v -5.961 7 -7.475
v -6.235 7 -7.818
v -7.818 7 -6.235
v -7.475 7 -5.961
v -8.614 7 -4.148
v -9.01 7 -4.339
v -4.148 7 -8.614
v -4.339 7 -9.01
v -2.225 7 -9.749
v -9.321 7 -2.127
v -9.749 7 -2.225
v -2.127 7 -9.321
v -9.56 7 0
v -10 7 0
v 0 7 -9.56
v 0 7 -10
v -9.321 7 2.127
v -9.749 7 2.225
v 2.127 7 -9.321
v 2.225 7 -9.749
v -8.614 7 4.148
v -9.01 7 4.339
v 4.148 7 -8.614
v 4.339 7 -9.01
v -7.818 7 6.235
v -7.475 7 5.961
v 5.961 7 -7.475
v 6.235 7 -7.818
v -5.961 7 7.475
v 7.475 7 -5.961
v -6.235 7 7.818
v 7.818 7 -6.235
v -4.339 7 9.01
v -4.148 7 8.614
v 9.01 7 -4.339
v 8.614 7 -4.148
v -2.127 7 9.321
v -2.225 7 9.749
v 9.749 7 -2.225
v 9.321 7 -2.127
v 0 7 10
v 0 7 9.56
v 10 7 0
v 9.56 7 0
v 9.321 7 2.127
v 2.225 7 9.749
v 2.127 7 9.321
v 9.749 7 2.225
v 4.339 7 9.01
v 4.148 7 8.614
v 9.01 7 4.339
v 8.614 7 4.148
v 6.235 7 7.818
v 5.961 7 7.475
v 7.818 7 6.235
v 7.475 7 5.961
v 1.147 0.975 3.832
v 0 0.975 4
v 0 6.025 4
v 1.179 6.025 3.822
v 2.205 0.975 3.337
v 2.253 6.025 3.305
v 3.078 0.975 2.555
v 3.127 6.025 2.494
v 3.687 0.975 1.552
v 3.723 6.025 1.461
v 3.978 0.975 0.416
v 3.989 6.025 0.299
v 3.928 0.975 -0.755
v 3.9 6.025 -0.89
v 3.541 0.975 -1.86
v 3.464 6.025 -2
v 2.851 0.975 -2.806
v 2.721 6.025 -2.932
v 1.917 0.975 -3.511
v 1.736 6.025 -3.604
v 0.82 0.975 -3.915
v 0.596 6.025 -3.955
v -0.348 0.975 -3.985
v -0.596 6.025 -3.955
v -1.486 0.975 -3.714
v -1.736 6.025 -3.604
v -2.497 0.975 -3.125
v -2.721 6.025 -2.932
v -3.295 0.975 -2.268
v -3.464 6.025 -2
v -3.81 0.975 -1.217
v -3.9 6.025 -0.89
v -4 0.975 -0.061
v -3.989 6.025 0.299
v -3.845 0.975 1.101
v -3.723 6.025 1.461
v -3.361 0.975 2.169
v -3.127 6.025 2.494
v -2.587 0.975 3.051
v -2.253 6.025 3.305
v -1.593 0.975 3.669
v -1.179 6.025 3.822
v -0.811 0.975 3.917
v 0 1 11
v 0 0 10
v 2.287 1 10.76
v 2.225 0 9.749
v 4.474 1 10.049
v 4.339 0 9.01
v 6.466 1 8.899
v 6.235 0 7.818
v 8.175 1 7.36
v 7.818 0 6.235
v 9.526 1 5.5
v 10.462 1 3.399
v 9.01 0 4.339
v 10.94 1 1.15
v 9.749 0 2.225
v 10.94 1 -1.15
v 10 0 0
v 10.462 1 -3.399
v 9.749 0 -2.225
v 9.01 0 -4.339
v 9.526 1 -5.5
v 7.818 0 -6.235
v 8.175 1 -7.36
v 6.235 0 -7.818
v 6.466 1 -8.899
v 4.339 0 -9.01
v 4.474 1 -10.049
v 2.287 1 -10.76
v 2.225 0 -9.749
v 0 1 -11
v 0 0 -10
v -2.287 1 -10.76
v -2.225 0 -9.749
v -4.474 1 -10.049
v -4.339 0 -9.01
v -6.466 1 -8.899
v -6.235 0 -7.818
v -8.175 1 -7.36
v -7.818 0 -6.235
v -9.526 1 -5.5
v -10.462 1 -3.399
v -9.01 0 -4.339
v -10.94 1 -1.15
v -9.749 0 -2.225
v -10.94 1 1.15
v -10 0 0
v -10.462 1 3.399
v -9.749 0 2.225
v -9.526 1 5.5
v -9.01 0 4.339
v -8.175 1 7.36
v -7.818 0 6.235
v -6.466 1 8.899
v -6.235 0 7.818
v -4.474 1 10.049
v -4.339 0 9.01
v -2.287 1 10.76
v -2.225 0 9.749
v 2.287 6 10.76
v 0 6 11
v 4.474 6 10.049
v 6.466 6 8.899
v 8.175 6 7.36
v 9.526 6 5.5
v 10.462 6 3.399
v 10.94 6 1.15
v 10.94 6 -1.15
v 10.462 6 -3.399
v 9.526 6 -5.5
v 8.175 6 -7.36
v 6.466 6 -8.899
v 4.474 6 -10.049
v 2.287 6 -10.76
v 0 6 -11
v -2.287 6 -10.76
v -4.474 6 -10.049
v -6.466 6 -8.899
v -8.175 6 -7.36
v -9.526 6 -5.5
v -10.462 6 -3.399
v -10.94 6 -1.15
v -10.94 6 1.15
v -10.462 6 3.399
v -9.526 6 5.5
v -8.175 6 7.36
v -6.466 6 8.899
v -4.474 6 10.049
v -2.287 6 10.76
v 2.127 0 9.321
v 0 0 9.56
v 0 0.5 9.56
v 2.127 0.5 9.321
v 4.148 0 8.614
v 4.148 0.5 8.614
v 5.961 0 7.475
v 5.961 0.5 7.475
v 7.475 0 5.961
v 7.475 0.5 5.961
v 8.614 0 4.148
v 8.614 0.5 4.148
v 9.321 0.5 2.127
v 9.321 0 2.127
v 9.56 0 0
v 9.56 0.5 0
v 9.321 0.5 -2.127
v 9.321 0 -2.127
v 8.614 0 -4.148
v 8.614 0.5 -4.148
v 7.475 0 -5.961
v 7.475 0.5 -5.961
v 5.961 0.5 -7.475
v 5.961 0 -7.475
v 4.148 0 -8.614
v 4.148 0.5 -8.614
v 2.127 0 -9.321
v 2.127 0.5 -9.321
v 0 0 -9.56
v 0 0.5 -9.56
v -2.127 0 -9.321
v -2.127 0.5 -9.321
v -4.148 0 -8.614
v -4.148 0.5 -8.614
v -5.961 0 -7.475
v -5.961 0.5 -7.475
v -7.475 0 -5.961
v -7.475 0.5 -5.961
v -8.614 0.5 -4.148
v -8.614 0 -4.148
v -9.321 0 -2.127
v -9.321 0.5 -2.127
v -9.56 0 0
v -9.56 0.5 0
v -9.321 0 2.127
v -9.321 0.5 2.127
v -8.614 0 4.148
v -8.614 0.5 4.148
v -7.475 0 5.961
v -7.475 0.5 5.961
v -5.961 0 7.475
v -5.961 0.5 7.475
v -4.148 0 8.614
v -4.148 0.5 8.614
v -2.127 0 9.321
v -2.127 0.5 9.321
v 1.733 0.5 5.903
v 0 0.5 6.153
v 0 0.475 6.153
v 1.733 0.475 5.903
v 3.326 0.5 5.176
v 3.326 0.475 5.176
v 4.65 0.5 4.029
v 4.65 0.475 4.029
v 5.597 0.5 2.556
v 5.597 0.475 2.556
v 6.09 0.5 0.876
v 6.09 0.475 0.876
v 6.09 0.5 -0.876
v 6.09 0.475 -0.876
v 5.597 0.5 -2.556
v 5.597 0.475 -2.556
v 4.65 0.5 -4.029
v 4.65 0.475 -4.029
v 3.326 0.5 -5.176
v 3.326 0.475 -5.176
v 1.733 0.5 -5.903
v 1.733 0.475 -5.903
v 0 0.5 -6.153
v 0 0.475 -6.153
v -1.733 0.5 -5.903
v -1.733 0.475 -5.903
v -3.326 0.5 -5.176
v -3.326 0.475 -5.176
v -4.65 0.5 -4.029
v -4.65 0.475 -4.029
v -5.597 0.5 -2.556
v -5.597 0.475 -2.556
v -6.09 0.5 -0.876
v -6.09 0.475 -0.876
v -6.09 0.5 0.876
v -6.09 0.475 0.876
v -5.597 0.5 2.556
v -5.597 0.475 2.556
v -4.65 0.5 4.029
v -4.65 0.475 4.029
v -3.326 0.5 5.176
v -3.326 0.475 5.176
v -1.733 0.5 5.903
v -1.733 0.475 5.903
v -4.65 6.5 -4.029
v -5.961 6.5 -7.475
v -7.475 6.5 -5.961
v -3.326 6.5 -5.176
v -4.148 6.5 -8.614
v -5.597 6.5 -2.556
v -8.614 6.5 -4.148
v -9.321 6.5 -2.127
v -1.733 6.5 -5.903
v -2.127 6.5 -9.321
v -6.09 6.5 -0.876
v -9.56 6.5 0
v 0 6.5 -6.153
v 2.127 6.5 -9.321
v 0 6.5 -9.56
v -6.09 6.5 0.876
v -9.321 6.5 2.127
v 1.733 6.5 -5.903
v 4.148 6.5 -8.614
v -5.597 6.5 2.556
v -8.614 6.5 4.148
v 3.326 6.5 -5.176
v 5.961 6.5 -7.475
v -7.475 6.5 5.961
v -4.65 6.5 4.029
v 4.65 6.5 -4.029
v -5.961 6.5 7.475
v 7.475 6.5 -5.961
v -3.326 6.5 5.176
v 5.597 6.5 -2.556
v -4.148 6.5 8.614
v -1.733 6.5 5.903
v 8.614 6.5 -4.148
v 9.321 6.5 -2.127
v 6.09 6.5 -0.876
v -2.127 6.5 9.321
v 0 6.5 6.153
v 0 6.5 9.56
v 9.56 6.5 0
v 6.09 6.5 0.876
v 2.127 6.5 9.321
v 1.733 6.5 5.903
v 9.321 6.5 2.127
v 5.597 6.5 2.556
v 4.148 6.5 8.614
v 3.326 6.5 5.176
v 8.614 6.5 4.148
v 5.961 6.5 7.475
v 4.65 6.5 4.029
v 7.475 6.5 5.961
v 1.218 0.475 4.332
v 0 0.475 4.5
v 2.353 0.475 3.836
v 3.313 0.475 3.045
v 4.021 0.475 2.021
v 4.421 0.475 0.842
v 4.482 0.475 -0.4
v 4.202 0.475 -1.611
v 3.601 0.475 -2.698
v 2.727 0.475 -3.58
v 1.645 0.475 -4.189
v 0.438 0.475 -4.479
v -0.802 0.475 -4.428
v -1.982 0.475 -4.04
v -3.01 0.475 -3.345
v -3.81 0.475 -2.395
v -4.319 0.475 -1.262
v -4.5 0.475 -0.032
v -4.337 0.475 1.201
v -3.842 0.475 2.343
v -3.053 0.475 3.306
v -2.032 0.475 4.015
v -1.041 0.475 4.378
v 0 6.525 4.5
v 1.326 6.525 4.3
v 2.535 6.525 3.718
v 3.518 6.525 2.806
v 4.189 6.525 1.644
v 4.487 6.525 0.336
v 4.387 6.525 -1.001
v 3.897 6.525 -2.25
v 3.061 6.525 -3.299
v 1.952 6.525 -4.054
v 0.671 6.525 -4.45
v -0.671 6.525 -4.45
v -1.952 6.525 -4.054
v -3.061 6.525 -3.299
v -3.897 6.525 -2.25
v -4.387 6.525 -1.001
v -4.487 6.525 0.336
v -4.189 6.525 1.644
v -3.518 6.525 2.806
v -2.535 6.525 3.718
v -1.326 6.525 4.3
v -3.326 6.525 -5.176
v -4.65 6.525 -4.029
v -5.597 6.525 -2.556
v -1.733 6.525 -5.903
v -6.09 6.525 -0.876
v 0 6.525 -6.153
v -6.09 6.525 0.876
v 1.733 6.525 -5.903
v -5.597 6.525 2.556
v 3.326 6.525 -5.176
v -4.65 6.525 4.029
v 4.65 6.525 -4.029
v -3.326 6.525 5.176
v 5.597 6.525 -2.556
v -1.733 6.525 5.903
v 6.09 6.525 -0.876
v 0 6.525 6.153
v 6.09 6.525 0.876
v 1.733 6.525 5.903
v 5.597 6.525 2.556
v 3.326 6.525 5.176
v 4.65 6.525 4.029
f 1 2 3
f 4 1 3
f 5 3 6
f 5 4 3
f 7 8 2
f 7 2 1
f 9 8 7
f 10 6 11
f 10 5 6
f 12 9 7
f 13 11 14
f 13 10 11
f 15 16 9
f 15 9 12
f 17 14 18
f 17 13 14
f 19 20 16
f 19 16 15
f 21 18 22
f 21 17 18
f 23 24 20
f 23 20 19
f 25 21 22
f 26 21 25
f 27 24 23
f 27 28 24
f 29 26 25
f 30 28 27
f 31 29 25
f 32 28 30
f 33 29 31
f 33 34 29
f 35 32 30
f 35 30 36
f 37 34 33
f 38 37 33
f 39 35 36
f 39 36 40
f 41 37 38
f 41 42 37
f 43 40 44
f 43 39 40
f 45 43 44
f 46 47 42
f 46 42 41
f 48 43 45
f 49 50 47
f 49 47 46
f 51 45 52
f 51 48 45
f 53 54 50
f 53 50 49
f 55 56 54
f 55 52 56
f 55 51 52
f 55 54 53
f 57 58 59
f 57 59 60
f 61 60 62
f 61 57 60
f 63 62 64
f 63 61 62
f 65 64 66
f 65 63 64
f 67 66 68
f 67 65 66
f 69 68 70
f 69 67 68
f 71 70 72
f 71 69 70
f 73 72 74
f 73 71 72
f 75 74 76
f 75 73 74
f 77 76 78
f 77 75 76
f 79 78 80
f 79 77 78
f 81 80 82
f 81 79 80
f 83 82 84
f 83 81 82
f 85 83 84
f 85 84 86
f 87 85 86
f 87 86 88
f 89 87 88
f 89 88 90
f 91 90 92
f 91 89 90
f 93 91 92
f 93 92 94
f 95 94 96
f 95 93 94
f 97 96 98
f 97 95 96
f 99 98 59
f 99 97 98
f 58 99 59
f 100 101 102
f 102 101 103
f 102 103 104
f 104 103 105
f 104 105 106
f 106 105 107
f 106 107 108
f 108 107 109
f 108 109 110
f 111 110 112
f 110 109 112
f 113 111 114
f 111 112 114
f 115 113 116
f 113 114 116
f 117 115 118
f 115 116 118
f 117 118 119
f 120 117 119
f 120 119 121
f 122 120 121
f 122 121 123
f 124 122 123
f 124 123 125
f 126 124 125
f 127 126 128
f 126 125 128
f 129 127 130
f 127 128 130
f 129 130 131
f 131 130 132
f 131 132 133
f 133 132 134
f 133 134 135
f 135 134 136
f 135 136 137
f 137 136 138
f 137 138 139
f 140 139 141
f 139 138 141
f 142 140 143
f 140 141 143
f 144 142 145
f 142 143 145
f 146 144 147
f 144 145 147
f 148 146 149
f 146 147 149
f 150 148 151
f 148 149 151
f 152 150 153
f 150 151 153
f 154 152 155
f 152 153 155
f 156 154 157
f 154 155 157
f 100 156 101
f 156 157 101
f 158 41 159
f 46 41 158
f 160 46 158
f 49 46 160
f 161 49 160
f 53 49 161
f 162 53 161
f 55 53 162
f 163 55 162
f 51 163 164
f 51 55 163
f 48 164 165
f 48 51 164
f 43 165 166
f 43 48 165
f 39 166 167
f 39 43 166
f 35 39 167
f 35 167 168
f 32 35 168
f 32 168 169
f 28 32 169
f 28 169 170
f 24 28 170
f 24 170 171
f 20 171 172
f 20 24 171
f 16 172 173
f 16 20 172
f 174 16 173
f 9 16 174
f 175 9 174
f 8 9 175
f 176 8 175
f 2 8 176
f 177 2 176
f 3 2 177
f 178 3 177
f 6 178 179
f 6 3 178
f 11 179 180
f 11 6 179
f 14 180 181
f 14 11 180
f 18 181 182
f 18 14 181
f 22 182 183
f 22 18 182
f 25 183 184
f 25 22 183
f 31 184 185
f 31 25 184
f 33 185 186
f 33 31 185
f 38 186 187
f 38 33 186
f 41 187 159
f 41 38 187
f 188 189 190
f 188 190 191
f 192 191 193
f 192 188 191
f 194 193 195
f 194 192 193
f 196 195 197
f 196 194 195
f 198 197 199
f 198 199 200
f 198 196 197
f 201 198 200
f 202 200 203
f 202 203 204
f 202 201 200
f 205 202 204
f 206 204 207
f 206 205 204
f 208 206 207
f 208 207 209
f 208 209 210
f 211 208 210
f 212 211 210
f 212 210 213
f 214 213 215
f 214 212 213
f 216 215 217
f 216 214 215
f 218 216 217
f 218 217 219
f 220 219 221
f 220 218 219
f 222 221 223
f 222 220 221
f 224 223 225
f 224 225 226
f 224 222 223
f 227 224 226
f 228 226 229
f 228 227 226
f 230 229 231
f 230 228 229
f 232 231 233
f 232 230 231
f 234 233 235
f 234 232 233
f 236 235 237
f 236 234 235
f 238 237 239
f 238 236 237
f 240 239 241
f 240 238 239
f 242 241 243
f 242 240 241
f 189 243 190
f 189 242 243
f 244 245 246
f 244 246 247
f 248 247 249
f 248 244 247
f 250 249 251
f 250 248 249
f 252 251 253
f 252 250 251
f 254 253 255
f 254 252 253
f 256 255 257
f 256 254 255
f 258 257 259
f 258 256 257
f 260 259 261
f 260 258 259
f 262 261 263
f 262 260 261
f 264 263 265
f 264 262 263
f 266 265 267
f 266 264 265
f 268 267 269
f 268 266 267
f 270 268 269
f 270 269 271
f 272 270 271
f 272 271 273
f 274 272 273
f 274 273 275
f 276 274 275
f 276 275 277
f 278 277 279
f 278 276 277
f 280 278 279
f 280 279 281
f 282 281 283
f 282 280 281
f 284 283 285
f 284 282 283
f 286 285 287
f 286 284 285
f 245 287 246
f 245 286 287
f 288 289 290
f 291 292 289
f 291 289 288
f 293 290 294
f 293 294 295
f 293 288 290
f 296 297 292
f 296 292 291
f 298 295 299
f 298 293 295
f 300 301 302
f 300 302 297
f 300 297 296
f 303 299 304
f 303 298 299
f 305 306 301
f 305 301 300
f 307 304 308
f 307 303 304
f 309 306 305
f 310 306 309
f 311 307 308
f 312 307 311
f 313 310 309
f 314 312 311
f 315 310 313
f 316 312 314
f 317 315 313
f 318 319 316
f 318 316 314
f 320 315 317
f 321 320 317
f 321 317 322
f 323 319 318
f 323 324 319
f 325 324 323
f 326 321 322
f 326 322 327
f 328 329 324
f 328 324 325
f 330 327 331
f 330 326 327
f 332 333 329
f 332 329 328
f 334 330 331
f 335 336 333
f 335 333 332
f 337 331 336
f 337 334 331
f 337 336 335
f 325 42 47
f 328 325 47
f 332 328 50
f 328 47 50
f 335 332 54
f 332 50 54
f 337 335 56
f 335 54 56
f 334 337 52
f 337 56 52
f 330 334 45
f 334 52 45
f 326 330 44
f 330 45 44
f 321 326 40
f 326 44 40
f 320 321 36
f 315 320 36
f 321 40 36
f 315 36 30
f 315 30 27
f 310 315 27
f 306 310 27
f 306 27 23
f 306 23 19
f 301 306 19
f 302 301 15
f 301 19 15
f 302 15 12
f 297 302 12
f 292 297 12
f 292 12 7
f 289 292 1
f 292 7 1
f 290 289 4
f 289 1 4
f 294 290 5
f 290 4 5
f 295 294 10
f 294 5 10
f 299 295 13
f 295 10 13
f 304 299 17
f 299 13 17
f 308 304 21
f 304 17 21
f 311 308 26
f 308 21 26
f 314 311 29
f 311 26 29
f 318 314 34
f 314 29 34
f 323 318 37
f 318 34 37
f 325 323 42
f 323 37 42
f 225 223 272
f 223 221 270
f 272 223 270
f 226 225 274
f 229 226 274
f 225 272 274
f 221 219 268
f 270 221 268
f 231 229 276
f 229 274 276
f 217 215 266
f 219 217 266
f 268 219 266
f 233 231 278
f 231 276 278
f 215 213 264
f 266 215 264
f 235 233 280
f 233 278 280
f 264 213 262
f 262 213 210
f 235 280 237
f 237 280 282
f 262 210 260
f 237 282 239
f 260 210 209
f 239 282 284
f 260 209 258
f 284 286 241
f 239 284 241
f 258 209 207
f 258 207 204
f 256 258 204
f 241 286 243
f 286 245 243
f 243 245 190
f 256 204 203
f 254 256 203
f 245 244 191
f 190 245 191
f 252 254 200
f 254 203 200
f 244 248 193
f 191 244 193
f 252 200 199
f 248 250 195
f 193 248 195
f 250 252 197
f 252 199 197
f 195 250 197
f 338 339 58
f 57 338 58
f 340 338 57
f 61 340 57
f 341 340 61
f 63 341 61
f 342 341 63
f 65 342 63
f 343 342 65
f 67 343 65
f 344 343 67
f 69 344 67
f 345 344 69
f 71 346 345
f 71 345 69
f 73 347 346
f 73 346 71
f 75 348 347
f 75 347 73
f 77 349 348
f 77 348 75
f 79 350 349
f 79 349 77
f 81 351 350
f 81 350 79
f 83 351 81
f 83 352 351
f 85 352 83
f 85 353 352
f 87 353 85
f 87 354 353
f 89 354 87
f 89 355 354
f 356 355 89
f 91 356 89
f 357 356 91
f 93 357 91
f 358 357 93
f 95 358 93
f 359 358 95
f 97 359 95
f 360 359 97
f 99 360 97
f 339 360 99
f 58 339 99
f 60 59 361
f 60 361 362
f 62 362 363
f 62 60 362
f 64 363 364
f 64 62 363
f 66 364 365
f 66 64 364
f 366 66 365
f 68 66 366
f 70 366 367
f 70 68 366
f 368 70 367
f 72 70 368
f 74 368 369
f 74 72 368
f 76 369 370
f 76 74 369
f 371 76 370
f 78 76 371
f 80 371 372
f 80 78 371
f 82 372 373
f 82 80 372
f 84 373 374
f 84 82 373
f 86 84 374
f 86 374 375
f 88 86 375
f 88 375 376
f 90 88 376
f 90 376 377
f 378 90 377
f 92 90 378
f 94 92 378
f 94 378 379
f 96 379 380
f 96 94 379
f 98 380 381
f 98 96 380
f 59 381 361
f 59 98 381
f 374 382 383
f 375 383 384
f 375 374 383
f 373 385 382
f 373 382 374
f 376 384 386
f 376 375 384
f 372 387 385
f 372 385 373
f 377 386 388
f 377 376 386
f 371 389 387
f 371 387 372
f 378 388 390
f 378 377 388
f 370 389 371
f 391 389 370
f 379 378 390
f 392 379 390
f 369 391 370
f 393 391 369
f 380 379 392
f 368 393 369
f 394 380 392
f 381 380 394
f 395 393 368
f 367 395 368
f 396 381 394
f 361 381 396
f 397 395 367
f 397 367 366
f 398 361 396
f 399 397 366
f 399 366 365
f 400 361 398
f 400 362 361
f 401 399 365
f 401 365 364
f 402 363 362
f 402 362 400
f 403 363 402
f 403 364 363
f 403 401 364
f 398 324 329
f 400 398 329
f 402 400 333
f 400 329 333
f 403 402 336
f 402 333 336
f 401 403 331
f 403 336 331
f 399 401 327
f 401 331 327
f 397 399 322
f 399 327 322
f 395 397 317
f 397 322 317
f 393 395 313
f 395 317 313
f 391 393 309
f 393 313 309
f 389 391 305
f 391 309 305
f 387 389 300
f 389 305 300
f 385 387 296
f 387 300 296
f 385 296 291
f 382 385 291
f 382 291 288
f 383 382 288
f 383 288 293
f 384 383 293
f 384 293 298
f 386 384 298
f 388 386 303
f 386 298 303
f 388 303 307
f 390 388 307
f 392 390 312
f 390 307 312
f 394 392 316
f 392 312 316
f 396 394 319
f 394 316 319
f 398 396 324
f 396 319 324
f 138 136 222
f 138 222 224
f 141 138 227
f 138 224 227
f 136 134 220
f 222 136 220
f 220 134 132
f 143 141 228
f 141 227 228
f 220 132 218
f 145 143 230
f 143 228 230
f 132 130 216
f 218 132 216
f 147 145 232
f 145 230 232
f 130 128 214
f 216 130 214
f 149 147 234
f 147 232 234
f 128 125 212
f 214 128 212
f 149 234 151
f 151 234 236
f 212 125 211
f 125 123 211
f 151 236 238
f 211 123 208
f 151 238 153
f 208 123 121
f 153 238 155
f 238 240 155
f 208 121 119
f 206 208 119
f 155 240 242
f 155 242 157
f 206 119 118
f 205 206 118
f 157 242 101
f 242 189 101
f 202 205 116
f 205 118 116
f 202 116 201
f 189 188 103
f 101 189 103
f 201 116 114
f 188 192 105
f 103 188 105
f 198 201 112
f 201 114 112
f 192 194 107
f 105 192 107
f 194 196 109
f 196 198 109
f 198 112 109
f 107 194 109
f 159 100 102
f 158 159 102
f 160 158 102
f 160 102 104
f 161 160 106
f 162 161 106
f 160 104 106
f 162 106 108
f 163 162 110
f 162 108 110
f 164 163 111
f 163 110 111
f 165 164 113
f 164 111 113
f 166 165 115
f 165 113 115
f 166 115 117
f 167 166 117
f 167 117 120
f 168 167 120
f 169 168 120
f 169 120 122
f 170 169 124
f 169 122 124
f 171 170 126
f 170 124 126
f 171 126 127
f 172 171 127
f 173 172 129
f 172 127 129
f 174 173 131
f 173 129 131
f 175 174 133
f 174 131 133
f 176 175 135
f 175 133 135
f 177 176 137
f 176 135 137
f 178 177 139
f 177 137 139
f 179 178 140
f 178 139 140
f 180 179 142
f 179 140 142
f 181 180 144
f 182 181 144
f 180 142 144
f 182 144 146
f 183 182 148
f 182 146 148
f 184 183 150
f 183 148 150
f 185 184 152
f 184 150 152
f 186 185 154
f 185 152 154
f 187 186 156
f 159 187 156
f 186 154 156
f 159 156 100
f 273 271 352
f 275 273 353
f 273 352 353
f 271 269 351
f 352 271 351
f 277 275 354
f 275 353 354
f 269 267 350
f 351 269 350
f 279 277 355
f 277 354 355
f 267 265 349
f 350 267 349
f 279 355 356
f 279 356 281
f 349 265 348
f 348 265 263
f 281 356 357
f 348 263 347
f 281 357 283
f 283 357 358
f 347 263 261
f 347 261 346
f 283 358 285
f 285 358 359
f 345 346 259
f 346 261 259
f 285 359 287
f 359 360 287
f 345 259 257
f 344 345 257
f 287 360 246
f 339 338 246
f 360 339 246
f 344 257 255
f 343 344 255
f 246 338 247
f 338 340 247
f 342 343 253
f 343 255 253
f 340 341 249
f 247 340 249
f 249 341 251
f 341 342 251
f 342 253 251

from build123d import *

# Parameters (mm, degrees)
SKETCH1_R                = 11
SKETCH1_R_2              = 4
BOSS_EXTRUDE1_DEPTH      = 7
CHAMFER1_SIZE            = 1
SKETCH2_R                = 9.560499877
CUT_EXTRUDE1_DEPTH       = 0.5
SKETCH3_R                = 6.152500931
SKETCH3_R_2              = 4
BOSS_EXTRUDE2_DEPTH      = 0.025
CHAMFER2_SIZE            = 0.5
CHAMFER2_OF_MIRROR3_SIZE = 0.5


with BuildPart() as part:
    # Sketch1 → Boss-Extrude1 (new body)
    with BuildSketch(Plane(origin=(0, 0, 0), x_dir=(1, 0, 0), z_dir=(0, 1, 0))):
        with Locations(Location((0, 0, 0), (0, 0, 270))):
            Circle(SKETCH1_R)
        with Locations(Location((0, 0, 0), (0, 0, 270))):
            Circle(SKETCH1_R_2, mode=Mode.SUBTRACT)
    extrude(amount=BOSS_EXTRUDE1_DEPTH)

    # Chamfer1
    chamfer1_edges = [part.edges().sort_by_distance(p)[0] for p in [
        (0, 0, -11),
        (0, 7, -11),
    ]]
    chamfer(chamfer1_edges, length=CHAMFER1_SIZE)

    # Sketch2 → Cut-Extrude1 (cut)
    with BuildSketch(Plane(origin=(0, 7, 0), x_dir=(1, 0, 0), z_dir=(0, 1, 0))):
        with Locations(Location((0, 0, 0), (0, 0, 270))):
            Circle(SKETCH2_R)
    cut_extrude1 = extrude(amount=-CUT_EXTRUDE1_DEPTH, mode=Mode.SUBTRACT)

    # Sketch3 → Boss-Extrude2 (add)
    with BuildSketch(Plane(origin=(0, 6.5, 0), x_dir=(1, 0, 0), z_dir=(0, 1, 0))):
        with Locations(Location((0, 0, 0), (0, 0, 270))):
            Circle(SKETCH3_R)
        with Locations(Location((0, 0, 0), (0, 0, 270))):
            Circle(SKETCH3_R_2, mode=Mode.SUBTRACT)
    boss_extrude2 = extrude(amount=BOSS_EXTRUDE2_DEPTH)

    # Chamfer2
    chamfer2_edges = [part.edges().sort_by_distance(p)[0] for p in [
        (0, 6.525, -4),
    ]]
    chamfer(chamfer2_edges, length=CHAMFER2_SIZE)

    # Mirror3: Cut-Extrude1, Boss-Extrude2 across plane
    add(cut_extrude1.mirror(Plane(origin=(0, 3.500000112, 0), x_dir=(0, 0, 1), z_dir=(0, -1, 0))), mode=Mode.SUBTRACT)
    add(boss_extrude2.mirror(Plane(origin=(0, 3.500000112, 0), x_dir=(0, 0, 1), z_dir=(0, -1, 0))))

    # Chamfer2 of Mirror3
    chamfer2_of_mirror3_edges = [part.edges().sort_by_distance(p)[0] for p in [
        (0, 0.475000224, -4),
    ]]
    chamfer(chamfer2_of_mirror3_edges, length=CHAMFER2_OF_MIRROR3_SIZE)


solid = part.part
